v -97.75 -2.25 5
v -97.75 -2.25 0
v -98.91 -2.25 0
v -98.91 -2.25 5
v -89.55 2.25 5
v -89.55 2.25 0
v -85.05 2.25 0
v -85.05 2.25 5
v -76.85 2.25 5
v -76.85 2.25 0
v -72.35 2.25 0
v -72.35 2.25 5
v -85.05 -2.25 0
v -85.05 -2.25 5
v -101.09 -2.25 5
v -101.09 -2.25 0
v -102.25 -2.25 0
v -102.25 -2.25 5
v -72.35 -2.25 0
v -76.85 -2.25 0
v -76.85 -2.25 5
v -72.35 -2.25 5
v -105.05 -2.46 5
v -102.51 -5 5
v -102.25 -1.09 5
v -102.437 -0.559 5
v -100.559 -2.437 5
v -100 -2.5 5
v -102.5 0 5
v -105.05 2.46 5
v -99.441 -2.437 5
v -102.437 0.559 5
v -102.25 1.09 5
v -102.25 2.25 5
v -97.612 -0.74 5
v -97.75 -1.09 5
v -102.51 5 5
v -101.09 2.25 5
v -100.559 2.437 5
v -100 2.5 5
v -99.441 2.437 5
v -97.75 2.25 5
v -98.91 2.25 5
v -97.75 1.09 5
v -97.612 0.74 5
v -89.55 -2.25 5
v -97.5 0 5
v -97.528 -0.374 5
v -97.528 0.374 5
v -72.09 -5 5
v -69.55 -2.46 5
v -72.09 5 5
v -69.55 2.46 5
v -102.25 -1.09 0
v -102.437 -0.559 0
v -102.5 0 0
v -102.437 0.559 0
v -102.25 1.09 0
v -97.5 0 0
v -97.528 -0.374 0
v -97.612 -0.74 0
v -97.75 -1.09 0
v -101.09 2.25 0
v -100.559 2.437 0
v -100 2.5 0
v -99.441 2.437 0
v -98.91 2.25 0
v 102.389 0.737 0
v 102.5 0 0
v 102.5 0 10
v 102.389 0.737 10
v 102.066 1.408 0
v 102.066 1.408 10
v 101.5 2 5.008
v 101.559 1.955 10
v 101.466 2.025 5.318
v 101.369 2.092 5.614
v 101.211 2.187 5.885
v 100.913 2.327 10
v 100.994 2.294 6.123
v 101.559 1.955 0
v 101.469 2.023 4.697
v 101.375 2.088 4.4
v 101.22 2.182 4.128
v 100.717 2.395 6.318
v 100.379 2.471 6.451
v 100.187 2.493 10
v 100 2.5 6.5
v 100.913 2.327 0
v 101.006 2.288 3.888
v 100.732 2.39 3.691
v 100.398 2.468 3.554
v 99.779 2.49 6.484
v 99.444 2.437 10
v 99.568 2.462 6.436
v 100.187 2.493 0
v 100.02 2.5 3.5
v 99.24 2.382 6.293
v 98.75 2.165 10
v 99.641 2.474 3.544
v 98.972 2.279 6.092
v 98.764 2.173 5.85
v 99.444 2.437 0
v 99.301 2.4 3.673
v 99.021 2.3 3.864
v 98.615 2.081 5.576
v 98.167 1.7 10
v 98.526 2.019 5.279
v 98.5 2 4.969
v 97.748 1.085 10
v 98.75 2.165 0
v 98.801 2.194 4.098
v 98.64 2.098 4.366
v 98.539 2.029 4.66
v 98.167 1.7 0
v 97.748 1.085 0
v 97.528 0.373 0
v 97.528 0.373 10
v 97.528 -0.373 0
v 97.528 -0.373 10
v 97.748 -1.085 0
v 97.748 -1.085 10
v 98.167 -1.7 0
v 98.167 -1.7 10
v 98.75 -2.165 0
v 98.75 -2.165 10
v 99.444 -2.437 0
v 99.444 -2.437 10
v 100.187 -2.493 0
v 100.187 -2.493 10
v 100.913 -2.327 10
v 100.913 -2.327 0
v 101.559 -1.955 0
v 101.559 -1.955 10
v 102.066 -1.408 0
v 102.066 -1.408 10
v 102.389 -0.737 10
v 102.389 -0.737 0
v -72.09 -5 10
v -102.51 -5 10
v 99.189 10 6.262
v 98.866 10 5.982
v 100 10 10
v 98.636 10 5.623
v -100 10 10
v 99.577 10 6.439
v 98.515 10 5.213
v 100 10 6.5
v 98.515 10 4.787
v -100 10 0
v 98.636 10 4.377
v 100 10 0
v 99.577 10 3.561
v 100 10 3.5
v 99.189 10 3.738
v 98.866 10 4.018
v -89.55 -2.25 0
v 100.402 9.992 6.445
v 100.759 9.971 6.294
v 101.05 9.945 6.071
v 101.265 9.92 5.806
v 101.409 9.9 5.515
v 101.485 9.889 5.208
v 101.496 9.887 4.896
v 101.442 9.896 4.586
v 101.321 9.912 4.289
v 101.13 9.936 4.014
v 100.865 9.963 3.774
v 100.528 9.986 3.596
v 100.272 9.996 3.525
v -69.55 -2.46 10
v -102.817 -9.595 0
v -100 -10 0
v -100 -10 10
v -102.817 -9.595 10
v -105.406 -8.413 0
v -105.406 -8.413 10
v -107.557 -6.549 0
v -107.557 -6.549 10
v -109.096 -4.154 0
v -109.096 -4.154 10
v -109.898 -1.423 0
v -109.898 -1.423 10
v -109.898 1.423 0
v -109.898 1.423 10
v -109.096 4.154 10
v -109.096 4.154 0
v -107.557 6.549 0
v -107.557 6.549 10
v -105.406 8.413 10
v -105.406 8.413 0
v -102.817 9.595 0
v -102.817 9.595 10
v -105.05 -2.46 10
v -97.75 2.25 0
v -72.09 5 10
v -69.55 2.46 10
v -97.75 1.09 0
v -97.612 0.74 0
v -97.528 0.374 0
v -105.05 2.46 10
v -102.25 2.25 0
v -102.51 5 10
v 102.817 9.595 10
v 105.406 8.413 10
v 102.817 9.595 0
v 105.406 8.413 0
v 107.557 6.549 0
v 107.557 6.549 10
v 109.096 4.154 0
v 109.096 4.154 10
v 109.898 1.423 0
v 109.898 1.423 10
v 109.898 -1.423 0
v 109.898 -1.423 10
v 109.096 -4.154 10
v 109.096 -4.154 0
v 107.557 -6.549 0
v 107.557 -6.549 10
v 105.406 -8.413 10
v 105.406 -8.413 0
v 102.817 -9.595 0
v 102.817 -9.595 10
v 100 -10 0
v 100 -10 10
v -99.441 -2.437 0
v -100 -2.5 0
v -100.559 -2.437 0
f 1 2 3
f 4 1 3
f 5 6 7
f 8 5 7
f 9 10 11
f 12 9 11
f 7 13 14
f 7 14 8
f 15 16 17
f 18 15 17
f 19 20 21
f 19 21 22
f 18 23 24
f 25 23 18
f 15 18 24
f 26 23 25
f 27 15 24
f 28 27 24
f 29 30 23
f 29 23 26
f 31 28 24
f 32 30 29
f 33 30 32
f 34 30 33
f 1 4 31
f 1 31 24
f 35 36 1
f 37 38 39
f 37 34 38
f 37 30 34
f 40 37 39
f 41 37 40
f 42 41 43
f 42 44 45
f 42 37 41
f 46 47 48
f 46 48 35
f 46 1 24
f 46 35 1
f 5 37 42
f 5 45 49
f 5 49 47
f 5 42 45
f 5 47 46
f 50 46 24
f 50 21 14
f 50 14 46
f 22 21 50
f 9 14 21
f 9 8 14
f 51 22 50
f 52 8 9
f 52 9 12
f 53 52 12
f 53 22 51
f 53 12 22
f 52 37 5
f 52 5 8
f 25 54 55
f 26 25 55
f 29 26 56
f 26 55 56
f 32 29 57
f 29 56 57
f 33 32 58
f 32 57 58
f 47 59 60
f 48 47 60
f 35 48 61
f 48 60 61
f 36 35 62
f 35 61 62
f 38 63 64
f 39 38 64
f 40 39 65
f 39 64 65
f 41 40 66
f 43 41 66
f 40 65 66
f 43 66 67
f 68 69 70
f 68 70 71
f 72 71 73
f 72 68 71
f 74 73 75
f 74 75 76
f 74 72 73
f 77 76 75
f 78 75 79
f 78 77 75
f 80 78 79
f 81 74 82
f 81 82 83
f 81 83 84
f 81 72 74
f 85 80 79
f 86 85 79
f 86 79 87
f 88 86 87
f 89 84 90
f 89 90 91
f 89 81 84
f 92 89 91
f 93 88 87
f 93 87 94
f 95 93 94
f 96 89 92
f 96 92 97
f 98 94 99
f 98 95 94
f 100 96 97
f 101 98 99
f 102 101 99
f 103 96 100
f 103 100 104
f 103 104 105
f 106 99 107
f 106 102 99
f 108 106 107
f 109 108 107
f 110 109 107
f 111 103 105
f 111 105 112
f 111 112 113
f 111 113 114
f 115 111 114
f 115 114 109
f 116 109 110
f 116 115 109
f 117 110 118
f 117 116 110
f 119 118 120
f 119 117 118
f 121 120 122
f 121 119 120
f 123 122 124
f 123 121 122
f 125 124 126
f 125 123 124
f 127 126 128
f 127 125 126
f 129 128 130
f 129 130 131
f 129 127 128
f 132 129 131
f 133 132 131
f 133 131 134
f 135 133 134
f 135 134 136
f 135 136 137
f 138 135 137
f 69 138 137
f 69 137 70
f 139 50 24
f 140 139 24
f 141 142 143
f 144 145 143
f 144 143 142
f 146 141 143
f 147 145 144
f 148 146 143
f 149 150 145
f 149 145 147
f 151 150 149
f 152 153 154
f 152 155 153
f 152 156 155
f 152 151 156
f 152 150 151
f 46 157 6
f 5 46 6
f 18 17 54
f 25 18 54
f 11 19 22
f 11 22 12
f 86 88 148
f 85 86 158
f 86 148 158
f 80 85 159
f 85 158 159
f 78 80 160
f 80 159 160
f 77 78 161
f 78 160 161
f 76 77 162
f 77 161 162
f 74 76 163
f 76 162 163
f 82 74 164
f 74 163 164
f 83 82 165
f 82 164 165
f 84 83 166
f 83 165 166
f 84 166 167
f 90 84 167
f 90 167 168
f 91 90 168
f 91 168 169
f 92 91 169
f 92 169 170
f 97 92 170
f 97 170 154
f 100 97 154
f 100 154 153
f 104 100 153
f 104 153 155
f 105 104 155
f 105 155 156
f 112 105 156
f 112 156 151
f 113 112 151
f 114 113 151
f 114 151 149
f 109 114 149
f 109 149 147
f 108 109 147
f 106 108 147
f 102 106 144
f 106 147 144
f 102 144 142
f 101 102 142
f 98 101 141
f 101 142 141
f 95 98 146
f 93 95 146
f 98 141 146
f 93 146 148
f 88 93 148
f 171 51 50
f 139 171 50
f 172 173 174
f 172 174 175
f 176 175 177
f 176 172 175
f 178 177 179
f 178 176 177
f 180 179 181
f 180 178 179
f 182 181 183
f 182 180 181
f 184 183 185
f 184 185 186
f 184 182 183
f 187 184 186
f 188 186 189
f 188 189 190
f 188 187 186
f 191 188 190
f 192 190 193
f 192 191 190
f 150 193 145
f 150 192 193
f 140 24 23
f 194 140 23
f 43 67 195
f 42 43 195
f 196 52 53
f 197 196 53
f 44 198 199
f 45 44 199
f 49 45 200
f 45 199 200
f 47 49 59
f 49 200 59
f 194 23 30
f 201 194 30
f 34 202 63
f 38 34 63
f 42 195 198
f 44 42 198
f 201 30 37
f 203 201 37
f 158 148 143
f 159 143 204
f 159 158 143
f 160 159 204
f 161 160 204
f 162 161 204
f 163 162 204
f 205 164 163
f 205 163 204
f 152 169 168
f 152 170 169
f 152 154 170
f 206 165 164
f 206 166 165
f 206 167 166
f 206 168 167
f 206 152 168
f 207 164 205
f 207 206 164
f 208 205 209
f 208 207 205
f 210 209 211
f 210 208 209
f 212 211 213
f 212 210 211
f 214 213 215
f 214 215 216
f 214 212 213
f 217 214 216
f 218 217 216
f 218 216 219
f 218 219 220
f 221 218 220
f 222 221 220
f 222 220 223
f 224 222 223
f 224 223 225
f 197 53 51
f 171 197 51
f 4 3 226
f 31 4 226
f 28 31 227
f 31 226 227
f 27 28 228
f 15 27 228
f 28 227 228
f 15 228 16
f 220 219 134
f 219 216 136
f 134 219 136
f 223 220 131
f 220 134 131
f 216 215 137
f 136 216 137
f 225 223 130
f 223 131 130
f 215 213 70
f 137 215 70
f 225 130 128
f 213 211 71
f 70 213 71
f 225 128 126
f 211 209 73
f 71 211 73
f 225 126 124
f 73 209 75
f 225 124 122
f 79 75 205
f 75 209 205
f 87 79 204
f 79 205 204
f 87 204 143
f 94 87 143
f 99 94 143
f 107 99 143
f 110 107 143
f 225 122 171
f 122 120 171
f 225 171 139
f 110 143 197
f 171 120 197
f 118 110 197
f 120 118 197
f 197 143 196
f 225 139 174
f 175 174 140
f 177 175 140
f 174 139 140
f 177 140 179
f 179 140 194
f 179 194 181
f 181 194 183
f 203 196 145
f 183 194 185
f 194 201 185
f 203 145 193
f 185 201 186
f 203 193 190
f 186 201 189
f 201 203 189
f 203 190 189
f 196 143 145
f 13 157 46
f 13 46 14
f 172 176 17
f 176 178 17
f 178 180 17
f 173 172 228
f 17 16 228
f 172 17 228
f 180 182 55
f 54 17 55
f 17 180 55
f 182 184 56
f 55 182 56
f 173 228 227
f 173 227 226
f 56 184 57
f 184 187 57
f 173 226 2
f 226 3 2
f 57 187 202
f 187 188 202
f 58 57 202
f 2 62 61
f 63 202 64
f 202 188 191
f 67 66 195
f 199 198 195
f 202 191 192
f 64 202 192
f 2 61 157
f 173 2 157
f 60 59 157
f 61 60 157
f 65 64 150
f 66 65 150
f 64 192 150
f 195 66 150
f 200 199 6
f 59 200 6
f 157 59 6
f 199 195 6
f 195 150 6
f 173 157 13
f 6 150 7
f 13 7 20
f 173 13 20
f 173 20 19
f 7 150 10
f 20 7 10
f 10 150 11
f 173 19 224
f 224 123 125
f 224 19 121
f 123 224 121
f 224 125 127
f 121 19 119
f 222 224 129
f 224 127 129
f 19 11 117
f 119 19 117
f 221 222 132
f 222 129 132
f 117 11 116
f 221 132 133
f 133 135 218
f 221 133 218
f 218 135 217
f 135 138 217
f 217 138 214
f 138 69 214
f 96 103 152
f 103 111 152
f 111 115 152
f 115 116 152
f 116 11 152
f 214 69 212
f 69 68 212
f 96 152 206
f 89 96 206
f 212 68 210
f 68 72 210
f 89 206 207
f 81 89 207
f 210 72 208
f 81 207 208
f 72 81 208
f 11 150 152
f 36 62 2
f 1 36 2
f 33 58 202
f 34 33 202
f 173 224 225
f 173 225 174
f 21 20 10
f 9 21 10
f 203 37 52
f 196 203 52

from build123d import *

# Parameters (mm, degrees)
SKETCH1_R               = 2.5
BOSS_EXTRUDE1_DEPTH     = 10
SKETCH1_4_W             = 4.5
SKETCH1_4_H             = 4.5
BOSS_EXTRUDE2_DEPTH     = 5
CUT_EXTRUDE1_REACH      = 114.25
CUT_EXTRUDE1_END_RADIUS = 2.5
SKETCH2_R               = 1.5


with BuildPart() as part:
    # Sketch1 → Boss-Extrude1 (new body)
    with BuildSketch(Plane.XY):
        with BuildLine():
            ThreePointArc((100, 10), (110, 0), (100, -10))
            Line((100, -10), (-100, -10))
            ThreePointArc((-100, -10), (-110, 0), (-100, 10))
            Line((-100, 10), (100, 10))
        make_face()
        with Locations((100, 0)):
            Circle(SKETCH1_R, mode=Mode.SUBTRACT)
        Polygon((-72.09, -5), (-102.51, -5), (-105.05, -2.46), (-105.05, 2.46), (-102.51, 5), (-72.09, 5), (-69.55, 2.46), (-69.55, -2.46), align=None, mode=Mode.SUBTRACT)
    extrude(amount=BOSS_EXTRUDE1_DEPTH)

    # Sketch1<4> → Boss-Extrude2 (add)
    with BuildSketch(Plane.XY):
        Polygon((-102.51, -5), (-72.09, -5), (-69.55, -2.46), (-69.55, 2.46), (-72.09, 5), (-102.51, 5), (-105.05, 2.46), (-105.05, -2.46), align=None)
        with BuildLine():
            Line((-98.910275264, 2.25), (-97.75, 2.25))
            Line((-97.75, 2.25), (-97.75, 1.089724736))
            ThreePointArc((-97.75, 1.089724736), (-97.563301414, 0.559016994), (-97.5, 0))
            ThreePointArc((-97.5, 0), (-97.563301414, -0.559016994), (-97.75, -1.089724736))
            Line((-97.75, -1.089724736), (-97.75, -2.25))
            Line((-97.75, -2.25), (-98.910275264, -2.25))
            ThreePointArc((-98.910275264, -2.25), (-100, -2.5), (-101.089724736, -2.25))
            Line((-101.089724736, -2.25), (-102.25, -2.25))
            Line((-102.25, -2.25), (-102.25, -1.089724736))
            ThreePointArc((-102.25, -1.089724736), (-102.5, 0), (-102.25, 1.089724736))
            Line((-102.25, 1.089724736), (-102.25, 2.25))
            Line((-102.25, 2.25), (-101.089724736, 2.25))
            ThreePointArc((-101.089724736, 2.25), (-100, 2.5), (-98.910275264, 2.25))
        make_face(mode=Mode.SUBTRACT)
        with Locations((-87.3, 0)):
            Rectangle(SKETCH1_4_W, SKETCH1_4_H, mode=Mode.SUBTRACT)
        with Locations((-74.6, 0)):
            Rectangle(SKETCH1_4_W, SKETCH1_4_H, mode=Mode.SUBTRACT)
    extrude(amount=BOSS_EXTRUDE2_DEPTH)

    # Cut-Extrude1: up to this cylinder (the profile starts outside it)
    cut_extrude1_end = Plane(origin=(100, 0, 5), z_dir=(0, 0, -1)) * Cylinder(CUT_EXTRUDE1_END_RADIUS, 234.5, mode=Mode.PRIVATE)
    # Sketch2 → Cut-Extrude1 (cut, up to the surface)
    with BuildSketch(Plane(origin=(0, 10, 0), x_dir=(1, 0, 0), z_dir=(0, 1, 0)), mode=Mode.PRIVATE) as cut_extrude1_sk1:
        with Locations(Location((100, -5, 0), (0, 0, 270))):
            Circle(SKETCH2_R)
    cut_extrude1_tool1 = extrude(cut_extrude1_sk1.sketch, amount=-CUT_EXTRUDE1_REACH, mode=Mode.PRIVATE) - cut_extrude1_end
    add(cut_extrude1_tool1.solids().sort_by_distance((100, 10, 5))[0], mode=Mode.SUBTRACT)


solid = part.part
